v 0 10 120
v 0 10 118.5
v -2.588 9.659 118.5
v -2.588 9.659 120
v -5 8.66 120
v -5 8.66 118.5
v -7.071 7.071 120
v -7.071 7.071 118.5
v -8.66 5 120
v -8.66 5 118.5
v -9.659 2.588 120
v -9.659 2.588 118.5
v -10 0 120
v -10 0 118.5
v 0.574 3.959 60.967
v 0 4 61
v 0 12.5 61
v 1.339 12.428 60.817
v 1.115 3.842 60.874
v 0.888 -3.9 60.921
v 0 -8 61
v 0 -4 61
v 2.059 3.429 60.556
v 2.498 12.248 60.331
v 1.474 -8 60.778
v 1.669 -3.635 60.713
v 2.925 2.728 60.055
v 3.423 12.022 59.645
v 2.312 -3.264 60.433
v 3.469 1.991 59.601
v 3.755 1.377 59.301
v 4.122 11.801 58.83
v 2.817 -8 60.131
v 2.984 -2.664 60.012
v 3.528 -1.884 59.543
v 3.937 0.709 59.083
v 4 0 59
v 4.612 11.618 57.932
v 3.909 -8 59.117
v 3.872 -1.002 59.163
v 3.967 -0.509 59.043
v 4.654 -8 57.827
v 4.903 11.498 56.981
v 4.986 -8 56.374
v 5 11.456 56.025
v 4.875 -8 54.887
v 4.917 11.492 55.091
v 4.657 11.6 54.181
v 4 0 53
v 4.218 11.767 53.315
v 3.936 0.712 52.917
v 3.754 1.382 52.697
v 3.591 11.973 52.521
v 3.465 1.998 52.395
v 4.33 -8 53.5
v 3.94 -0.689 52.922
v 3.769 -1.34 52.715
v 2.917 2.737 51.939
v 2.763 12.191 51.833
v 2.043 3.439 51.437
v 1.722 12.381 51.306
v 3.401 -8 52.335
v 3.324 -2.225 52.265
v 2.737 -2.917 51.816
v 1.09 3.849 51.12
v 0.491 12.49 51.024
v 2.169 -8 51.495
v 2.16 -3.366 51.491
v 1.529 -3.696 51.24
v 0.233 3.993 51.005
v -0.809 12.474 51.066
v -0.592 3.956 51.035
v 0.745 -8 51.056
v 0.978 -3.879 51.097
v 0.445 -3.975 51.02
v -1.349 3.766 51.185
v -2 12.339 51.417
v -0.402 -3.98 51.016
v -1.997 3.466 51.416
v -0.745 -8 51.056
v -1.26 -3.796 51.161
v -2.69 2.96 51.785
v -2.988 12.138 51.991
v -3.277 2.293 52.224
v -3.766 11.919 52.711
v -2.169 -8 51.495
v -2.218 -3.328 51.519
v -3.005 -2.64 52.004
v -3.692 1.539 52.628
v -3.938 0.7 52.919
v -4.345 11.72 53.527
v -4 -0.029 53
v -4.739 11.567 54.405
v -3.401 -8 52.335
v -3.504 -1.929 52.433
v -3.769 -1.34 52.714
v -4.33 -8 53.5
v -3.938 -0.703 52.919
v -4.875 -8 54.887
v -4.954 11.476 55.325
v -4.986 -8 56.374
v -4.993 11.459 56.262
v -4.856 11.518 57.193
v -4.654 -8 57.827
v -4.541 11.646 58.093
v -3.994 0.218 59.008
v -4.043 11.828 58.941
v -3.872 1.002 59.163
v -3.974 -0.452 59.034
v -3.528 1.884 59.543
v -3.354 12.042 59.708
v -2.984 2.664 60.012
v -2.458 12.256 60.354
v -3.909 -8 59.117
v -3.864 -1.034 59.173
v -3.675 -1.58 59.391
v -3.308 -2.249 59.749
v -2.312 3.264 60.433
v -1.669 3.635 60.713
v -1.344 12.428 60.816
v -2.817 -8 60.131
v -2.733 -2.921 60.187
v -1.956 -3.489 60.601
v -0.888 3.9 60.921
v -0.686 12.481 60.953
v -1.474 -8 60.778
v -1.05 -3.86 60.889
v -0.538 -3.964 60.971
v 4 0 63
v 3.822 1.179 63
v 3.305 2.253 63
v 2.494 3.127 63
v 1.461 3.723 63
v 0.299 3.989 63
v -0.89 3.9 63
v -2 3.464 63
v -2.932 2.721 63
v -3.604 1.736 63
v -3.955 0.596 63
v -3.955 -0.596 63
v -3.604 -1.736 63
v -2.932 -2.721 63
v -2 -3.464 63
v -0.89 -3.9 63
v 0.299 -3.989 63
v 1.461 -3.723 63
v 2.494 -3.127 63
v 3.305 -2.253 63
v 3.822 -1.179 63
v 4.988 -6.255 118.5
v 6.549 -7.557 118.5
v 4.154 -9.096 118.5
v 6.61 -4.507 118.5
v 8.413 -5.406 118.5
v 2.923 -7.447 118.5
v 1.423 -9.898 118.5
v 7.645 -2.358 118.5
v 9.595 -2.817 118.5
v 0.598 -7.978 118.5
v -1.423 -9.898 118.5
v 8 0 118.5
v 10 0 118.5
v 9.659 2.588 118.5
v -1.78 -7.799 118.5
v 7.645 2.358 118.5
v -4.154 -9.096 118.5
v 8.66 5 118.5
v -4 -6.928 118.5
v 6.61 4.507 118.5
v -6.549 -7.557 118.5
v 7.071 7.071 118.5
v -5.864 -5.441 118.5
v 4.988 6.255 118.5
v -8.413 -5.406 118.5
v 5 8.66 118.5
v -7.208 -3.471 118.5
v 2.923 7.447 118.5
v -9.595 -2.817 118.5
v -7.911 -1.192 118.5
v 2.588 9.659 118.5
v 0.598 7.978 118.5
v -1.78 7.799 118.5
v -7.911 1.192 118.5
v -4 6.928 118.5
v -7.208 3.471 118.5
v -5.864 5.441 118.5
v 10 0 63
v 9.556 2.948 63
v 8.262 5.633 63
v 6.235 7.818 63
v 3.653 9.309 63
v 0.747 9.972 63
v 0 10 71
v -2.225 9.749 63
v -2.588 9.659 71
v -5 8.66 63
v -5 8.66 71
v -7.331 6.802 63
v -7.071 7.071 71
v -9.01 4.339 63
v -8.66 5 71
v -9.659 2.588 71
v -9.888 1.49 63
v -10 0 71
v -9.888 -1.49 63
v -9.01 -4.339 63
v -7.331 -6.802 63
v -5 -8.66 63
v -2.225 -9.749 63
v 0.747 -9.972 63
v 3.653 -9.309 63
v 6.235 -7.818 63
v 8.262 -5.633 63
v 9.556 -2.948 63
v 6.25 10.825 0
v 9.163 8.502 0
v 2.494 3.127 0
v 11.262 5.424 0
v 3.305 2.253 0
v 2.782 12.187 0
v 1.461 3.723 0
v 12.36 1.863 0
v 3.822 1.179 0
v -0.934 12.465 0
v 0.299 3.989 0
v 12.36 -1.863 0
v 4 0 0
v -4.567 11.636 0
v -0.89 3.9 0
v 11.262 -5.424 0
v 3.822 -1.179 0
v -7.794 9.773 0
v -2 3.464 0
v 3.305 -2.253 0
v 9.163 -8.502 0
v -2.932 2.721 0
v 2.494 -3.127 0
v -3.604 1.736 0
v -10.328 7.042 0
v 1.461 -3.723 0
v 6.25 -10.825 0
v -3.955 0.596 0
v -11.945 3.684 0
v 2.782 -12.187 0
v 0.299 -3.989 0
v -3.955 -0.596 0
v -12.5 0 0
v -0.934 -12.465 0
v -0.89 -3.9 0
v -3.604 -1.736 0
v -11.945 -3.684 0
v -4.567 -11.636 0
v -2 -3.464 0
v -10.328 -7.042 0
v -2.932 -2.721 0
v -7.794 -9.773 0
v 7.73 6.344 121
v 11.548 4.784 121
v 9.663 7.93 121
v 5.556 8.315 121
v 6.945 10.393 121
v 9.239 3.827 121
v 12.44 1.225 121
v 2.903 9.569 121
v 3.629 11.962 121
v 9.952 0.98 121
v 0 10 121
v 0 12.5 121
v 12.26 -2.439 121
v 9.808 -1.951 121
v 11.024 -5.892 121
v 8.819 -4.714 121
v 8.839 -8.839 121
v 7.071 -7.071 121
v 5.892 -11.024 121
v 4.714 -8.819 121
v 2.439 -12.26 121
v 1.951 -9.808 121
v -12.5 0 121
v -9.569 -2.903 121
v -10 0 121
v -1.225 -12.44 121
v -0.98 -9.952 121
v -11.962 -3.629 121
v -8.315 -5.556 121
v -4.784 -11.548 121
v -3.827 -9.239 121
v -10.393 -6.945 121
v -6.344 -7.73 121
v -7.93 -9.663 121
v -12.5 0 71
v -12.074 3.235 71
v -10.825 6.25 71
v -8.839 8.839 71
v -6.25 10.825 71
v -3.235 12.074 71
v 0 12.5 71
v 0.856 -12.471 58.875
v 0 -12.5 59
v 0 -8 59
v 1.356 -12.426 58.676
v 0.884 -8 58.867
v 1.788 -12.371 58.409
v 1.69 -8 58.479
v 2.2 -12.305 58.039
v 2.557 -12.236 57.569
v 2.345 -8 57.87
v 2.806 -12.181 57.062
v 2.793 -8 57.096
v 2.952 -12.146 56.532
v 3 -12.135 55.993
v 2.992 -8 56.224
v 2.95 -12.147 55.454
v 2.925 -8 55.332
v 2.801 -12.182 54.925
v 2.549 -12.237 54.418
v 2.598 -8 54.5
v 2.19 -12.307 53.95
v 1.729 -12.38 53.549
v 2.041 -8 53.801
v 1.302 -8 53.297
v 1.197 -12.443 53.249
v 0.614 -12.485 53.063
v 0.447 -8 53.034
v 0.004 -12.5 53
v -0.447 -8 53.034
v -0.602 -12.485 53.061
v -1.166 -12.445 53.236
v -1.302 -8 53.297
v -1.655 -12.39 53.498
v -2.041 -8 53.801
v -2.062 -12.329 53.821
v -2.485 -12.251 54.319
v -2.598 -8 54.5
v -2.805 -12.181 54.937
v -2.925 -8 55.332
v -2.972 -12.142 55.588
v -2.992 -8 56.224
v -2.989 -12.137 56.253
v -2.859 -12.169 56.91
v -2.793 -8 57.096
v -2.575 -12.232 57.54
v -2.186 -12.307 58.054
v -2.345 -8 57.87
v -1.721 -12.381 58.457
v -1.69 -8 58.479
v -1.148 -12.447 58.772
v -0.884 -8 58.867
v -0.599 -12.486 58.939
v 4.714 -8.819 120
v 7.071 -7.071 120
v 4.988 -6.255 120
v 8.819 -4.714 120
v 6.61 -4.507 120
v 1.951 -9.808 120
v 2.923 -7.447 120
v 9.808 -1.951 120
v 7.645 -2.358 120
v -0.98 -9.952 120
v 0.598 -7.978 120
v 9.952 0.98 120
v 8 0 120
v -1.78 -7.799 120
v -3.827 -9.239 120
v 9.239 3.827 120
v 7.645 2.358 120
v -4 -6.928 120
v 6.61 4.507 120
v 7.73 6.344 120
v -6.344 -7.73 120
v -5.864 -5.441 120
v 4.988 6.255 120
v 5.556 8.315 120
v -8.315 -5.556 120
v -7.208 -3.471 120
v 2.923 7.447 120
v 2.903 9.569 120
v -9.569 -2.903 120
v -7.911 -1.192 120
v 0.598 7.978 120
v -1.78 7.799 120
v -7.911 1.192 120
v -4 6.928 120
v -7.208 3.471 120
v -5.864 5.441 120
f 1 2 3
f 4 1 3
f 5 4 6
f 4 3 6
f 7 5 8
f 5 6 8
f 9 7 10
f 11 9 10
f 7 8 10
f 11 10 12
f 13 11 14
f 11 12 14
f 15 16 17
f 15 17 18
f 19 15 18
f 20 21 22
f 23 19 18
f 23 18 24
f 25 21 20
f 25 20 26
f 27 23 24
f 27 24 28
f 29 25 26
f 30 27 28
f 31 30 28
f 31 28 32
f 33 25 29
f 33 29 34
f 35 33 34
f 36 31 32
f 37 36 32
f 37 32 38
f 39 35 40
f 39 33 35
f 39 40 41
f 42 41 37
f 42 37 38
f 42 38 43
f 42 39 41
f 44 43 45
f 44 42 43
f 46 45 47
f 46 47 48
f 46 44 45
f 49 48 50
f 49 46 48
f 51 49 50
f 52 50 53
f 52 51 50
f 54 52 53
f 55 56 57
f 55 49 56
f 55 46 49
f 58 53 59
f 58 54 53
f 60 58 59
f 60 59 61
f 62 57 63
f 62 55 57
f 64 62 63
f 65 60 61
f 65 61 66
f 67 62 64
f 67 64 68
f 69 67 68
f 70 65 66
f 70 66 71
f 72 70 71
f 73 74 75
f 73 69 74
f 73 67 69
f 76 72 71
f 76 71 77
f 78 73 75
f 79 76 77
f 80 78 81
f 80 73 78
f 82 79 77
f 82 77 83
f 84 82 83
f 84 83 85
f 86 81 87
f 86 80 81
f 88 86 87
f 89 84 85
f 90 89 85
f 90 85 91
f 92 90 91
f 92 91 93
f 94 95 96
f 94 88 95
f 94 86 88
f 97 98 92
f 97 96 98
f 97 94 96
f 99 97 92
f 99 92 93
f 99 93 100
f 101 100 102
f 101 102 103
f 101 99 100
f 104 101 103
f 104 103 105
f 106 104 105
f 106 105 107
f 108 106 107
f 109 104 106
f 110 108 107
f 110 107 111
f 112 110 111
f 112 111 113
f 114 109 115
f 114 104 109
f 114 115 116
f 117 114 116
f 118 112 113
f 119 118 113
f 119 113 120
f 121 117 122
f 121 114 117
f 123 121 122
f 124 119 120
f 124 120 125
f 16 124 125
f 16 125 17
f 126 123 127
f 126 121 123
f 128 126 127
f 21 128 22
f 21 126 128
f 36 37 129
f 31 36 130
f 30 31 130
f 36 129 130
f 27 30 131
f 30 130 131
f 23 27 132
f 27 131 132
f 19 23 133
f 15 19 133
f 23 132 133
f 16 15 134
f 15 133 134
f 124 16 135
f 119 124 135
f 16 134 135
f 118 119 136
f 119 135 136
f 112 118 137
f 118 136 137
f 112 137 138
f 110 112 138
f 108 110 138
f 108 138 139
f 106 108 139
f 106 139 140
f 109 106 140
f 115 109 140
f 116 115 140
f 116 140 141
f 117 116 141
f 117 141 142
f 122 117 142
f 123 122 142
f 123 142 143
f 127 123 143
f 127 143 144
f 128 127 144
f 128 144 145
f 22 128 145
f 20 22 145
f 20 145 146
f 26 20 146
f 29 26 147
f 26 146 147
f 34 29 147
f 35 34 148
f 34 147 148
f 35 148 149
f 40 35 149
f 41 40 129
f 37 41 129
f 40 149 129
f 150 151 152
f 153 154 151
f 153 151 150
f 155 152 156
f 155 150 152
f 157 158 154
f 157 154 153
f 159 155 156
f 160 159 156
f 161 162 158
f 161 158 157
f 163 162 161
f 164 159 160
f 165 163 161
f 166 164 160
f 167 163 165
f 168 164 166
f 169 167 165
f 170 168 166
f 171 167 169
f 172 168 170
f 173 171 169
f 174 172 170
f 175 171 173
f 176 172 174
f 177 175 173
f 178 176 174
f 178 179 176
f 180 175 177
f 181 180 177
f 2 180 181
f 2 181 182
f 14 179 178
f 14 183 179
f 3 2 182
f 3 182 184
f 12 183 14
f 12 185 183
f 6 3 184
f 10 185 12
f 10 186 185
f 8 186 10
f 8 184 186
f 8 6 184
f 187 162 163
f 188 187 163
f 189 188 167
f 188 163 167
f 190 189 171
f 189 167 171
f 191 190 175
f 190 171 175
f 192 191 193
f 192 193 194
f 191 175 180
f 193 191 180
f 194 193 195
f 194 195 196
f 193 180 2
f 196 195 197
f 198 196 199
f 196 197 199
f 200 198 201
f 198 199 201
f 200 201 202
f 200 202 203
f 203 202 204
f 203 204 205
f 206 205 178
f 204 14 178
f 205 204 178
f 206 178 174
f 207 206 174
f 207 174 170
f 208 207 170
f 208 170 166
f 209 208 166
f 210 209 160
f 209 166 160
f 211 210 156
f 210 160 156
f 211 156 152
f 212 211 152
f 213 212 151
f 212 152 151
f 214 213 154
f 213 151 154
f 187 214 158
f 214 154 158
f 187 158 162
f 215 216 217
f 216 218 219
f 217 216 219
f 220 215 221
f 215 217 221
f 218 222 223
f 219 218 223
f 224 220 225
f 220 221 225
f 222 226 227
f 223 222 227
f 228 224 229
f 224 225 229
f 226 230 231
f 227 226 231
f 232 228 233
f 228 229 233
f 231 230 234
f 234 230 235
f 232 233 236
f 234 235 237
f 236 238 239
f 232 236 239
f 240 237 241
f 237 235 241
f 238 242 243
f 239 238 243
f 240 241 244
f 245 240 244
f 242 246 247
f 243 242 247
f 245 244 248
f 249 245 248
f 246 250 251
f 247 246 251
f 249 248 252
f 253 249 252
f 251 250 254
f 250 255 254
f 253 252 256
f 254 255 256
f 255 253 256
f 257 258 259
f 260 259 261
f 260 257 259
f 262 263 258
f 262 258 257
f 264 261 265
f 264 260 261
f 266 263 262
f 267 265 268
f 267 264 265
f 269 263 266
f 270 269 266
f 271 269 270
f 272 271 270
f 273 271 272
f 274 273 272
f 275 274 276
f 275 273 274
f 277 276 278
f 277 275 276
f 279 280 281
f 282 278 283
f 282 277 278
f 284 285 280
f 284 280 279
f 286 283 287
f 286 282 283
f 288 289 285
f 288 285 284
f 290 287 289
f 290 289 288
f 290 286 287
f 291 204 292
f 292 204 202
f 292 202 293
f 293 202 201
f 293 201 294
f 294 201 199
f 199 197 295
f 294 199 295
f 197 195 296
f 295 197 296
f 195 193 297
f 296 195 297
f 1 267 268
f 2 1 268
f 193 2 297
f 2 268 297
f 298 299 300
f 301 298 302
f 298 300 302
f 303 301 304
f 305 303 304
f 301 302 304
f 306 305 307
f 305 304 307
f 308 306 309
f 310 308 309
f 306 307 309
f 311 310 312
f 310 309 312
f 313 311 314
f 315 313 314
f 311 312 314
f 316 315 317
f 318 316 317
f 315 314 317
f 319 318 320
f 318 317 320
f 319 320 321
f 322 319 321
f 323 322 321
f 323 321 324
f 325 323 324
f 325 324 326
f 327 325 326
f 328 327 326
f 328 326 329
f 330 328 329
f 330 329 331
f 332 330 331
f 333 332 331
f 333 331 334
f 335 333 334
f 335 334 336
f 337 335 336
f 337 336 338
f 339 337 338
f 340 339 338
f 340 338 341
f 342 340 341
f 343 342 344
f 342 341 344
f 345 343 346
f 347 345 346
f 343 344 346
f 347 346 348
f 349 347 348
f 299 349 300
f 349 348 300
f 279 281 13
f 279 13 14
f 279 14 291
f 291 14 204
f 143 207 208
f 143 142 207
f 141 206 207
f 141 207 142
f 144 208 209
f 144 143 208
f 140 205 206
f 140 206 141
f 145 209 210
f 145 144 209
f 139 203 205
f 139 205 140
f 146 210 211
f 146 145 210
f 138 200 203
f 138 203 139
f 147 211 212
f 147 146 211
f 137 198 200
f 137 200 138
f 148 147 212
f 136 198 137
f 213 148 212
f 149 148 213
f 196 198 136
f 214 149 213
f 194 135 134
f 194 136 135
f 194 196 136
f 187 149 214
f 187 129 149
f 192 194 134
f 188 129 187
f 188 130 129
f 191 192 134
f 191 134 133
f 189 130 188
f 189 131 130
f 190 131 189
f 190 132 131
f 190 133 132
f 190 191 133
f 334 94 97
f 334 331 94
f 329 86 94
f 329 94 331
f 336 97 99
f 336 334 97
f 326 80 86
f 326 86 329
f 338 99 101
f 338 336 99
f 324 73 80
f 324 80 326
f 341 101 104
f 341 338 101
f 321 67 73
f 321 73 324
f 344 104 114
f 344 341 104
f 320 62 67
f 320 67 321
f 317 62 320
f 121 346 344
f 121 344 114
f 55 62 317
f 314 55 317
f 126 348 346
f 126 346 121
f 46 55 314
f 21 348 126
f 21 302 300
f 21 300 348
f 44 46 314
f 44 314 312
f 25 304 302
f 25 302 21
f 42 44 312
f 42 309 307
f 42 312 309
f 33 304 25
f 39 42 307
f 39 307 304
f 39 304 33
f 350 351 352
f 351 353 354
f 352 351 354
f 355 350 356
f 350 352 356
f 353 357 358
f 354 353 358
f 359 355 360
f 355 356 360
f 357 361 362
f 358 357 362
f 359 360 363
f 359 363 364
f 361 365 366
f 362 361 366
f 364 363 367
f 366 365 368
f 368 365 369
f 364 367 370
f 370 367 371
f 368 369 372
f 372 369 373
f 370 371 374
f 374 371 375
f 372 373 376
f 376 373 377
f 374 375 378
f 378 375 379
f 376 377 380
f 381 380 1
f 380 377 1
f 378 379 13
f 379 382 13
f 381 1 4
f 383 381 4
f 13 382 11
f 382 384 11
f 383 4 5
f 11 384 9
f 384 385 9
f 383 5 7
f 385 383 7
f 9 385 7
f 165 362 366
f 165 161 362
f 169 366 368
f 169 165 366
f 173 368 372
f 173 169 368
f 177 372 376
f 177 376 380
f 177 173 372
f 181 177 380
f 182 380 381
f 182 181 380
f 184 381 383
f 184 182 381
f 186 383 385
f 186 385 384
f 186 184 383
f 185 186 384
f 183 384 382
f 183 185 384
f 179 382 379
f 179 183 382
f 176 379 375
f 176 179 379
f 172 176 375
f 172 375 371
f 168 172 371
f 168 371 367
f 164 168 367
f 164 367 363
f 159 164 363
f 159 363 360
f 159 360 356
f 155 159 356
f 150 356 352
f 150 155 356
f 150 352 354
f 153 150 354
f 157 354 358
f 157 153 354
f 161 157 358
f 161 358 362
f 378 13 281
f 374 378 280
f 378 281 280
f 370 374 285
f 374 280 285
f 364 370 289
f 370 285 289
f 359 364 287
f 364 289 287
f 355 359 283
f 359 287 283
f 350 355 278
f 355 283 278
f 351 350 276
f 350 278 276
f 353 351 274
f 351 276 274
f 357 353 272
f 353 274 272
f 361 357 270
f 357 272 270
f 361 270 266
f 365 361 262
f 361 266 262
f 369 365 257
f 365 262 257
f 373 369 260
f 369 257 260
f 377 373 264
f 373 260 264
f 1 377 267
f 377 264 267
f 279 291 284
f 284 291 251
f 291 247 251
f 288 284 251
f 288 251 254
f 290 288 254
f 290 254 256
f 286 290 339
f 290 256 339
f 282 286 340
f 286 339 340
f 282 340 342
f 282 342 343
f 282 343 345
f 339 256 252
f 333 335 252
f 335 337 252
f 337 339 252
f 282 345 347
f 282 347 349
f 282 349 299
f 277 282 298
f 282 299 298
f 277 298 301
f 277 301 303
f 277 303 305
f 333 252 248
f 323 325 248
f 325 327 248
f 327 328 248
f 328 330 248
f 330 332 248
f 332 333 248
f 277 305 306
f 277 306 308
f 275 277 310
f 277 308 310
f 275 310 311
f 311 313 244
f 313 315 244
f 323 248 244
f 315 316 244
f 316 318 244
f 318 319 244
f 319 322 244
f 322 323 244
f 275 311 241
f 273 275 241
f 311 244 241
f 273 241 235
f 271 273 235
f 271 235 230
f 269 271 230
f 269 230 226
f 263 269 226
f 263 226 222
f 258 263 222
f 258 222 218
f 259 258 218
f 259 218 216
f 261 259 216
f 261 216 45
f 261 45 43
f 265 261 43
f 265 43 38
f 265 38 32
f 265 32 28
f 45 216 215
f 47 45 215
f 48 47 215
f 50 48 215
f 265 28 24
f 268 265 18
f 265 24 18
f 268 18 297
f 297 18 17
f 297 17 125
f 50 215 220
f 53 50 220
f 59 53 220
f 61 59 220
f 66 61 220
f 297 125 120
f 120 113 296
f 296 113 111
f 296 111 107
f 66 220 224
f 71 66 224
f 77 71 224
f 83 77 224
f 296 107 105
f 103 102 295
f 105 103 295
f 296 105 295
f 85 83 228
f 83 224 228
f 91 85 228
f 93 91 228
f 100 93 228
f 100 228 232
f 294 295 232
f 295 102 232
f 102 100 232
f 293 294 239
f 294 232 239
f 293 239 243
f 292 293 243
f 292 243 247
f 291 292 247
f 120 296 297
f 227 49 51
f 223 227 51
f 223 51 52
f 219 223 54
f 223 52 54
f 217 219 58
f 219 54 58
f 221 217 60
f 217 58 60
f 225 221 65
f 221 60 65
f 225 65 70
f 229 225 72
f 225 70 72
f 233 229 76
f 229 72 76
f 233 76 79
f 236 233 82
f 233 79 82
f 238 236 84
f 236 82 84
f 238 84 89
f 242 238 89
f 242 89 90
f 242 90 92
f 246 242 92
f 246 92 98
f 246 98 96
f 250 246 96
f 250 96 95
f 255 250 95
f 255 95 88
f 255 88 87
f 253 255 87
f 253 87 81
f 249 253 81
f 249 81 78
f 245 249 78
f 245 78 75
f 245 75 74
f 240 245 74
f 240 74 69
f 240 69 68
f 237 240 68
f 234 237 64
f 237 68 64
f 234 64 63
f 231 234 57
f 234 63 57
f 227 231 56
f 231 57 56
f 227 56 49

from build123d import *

# Parameters (mm, degrees)
ESQUISSE1_R                  = 12.5
BASE_EXTRUSION_DEPTH         = 121
ESQUISSE2_R                  = 10
ENL_V_MAT_EXTRU_1_DEPTH      = 58
ESQUISSE3_R                  = 4
ENL_V_MAT_EXTRU_2_DEPTH      = 66.433172015
ENL_V_MAT_EXTRU_3_DEPTH      = 15
ENL_V_MAT_EXTRU_3_DEPTH_BACK = 8
ESQUISSE4_R                  = 5
ESQUISSE5_R                  = 3
ENL_V_MAT_EXTRU_4_DEPTH      = 124.35923164
ESQUISSE9_W                  = 55
ESQUISSE9_H                  = 32.337681811
ENL_V_MAT_EXTRU_6_DEPTH      = 123.284504453
ESQUISSE6_W                  = 1.5
ESQUISSE6_H                  = 2


with BuildPart() as part:
    # Esquisse1 → Base-Extrusion (new body)
    with BuildSketch(Plane.XY):
        with Locations(Location((0, 0, 0), (0, 0, 180))):
            Circle(ESQUISSE1_R)
    extrude(amount=BASE_EXTRUSION_DEPTH)

    # Esquisse2 → Enlèv. mat.-Extru.1 (cut)
    with BuildSketch(Plane.XY.offset(121)):
        Circle(ESQUISSE2_R)
    extrude(amount=-ENL_V_MAT_EXTRU_1_DEPTH, mode=Mode.SUBTRACT)

    # Esquisse3 → Enlèv. mat.-Extru.2 (cut, through all)
    with BuildSketch(Plane.XY.offset(63)):
        Circle(ESQUISSE3_R)
    extrude(amount=-ENL_V_MAT_EXTRU_2_DEPTH, mode=Mode.SUBTRACT)

    # Esquisse4 → Enlèv. mat.-Extru.3 (cut, two sides: drawn at the far end of the back side and taken through both)
    with BuildSketch(Plane(origin=(0, 0, 0), x_dir=(-1, 0, 0), z_dir=(0, 1, 0)).offset(-ENL_V_MAT_EXTRU_3_DEPTH_BACK)):
        with Locations(Location((0, 56, 0), (0, 0, 90))):
            Circle(ESQUISSE4_R)
    extrude(amount=ENL_V_MAT_EXTRU_3_DEPTH + ENL_V_MAT_EXTRU_3_DEPTH_BACK, mode=Mode.SUBTRACT)

    # Esquisse5 → Enlèv. mat.-Extru.4 (cut, through all)
    with BuildSketch(Plane(origin=(0, -8, 0), x_dir=(-1, 0, 0), z_dir=(0, 1, 0))):
        with Locations(Location((0, 56, 0), (0, 0, 90))):
            Circle(ESQUISSE5_R)
    extrude(amount=-ENL_V_MAT_EXTRU_4_DEPTH, mode=Mode.SUBTRACT)

    # Esquisse9 → Enlèv. mat.-Extru.6 (cut, through all)
    with BuildSketch(Plane(origin=(0, 0, 0), x_dir=(0, 0, -1), z_dir=(1, 0, 0))):
        with Locations((-98.5, 16.168840906)):
            Rectangle(ESQUISSE9_W, ESQUISSE9_H)
    extrude(amount=-ENL_V_MAT_EXTRU_6_DEPTH, mode=Mode.SUBTRACT)

    # Esquisse6 → Anneau élastique (revolve)
    with BuildSketch(Plane(origin=(0, 0, 0), x_dir=(0, 0, -1), z_dir=(1, 0, 0)), mode=Mode.PRIVATE) as anneau_lastique_sk:
        with Locations((-119.25, 9)):
            Rectangle(ESQUISSE6_W, ESQUISSE6_H)
    revolve(anneau_lastique_sk.sketch.rotate(Axis((0, 0, -6.276986183), (0, 0, 1)), 270), axis=Axis((0, 0, -6.276986183), (0, 0, 1)))


solid = part.part
